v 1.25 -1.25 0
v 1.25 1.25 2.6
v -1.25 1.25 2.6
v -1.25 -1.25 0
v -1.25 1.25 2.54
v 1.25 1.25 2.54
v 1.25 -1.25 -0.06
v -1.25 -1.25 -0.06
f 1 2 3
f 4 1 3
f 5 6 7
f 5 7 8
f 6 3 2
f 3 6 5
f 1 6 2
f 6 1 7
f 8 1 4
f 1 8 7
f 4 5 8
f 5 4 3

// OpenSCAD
// Tent shell kit: roof slope. See lib/lodge_kit.scad.
include <lib/lodge_kit.scad>
kind = "tent";
roof_tile([1, 1, 0, 0], 0);
